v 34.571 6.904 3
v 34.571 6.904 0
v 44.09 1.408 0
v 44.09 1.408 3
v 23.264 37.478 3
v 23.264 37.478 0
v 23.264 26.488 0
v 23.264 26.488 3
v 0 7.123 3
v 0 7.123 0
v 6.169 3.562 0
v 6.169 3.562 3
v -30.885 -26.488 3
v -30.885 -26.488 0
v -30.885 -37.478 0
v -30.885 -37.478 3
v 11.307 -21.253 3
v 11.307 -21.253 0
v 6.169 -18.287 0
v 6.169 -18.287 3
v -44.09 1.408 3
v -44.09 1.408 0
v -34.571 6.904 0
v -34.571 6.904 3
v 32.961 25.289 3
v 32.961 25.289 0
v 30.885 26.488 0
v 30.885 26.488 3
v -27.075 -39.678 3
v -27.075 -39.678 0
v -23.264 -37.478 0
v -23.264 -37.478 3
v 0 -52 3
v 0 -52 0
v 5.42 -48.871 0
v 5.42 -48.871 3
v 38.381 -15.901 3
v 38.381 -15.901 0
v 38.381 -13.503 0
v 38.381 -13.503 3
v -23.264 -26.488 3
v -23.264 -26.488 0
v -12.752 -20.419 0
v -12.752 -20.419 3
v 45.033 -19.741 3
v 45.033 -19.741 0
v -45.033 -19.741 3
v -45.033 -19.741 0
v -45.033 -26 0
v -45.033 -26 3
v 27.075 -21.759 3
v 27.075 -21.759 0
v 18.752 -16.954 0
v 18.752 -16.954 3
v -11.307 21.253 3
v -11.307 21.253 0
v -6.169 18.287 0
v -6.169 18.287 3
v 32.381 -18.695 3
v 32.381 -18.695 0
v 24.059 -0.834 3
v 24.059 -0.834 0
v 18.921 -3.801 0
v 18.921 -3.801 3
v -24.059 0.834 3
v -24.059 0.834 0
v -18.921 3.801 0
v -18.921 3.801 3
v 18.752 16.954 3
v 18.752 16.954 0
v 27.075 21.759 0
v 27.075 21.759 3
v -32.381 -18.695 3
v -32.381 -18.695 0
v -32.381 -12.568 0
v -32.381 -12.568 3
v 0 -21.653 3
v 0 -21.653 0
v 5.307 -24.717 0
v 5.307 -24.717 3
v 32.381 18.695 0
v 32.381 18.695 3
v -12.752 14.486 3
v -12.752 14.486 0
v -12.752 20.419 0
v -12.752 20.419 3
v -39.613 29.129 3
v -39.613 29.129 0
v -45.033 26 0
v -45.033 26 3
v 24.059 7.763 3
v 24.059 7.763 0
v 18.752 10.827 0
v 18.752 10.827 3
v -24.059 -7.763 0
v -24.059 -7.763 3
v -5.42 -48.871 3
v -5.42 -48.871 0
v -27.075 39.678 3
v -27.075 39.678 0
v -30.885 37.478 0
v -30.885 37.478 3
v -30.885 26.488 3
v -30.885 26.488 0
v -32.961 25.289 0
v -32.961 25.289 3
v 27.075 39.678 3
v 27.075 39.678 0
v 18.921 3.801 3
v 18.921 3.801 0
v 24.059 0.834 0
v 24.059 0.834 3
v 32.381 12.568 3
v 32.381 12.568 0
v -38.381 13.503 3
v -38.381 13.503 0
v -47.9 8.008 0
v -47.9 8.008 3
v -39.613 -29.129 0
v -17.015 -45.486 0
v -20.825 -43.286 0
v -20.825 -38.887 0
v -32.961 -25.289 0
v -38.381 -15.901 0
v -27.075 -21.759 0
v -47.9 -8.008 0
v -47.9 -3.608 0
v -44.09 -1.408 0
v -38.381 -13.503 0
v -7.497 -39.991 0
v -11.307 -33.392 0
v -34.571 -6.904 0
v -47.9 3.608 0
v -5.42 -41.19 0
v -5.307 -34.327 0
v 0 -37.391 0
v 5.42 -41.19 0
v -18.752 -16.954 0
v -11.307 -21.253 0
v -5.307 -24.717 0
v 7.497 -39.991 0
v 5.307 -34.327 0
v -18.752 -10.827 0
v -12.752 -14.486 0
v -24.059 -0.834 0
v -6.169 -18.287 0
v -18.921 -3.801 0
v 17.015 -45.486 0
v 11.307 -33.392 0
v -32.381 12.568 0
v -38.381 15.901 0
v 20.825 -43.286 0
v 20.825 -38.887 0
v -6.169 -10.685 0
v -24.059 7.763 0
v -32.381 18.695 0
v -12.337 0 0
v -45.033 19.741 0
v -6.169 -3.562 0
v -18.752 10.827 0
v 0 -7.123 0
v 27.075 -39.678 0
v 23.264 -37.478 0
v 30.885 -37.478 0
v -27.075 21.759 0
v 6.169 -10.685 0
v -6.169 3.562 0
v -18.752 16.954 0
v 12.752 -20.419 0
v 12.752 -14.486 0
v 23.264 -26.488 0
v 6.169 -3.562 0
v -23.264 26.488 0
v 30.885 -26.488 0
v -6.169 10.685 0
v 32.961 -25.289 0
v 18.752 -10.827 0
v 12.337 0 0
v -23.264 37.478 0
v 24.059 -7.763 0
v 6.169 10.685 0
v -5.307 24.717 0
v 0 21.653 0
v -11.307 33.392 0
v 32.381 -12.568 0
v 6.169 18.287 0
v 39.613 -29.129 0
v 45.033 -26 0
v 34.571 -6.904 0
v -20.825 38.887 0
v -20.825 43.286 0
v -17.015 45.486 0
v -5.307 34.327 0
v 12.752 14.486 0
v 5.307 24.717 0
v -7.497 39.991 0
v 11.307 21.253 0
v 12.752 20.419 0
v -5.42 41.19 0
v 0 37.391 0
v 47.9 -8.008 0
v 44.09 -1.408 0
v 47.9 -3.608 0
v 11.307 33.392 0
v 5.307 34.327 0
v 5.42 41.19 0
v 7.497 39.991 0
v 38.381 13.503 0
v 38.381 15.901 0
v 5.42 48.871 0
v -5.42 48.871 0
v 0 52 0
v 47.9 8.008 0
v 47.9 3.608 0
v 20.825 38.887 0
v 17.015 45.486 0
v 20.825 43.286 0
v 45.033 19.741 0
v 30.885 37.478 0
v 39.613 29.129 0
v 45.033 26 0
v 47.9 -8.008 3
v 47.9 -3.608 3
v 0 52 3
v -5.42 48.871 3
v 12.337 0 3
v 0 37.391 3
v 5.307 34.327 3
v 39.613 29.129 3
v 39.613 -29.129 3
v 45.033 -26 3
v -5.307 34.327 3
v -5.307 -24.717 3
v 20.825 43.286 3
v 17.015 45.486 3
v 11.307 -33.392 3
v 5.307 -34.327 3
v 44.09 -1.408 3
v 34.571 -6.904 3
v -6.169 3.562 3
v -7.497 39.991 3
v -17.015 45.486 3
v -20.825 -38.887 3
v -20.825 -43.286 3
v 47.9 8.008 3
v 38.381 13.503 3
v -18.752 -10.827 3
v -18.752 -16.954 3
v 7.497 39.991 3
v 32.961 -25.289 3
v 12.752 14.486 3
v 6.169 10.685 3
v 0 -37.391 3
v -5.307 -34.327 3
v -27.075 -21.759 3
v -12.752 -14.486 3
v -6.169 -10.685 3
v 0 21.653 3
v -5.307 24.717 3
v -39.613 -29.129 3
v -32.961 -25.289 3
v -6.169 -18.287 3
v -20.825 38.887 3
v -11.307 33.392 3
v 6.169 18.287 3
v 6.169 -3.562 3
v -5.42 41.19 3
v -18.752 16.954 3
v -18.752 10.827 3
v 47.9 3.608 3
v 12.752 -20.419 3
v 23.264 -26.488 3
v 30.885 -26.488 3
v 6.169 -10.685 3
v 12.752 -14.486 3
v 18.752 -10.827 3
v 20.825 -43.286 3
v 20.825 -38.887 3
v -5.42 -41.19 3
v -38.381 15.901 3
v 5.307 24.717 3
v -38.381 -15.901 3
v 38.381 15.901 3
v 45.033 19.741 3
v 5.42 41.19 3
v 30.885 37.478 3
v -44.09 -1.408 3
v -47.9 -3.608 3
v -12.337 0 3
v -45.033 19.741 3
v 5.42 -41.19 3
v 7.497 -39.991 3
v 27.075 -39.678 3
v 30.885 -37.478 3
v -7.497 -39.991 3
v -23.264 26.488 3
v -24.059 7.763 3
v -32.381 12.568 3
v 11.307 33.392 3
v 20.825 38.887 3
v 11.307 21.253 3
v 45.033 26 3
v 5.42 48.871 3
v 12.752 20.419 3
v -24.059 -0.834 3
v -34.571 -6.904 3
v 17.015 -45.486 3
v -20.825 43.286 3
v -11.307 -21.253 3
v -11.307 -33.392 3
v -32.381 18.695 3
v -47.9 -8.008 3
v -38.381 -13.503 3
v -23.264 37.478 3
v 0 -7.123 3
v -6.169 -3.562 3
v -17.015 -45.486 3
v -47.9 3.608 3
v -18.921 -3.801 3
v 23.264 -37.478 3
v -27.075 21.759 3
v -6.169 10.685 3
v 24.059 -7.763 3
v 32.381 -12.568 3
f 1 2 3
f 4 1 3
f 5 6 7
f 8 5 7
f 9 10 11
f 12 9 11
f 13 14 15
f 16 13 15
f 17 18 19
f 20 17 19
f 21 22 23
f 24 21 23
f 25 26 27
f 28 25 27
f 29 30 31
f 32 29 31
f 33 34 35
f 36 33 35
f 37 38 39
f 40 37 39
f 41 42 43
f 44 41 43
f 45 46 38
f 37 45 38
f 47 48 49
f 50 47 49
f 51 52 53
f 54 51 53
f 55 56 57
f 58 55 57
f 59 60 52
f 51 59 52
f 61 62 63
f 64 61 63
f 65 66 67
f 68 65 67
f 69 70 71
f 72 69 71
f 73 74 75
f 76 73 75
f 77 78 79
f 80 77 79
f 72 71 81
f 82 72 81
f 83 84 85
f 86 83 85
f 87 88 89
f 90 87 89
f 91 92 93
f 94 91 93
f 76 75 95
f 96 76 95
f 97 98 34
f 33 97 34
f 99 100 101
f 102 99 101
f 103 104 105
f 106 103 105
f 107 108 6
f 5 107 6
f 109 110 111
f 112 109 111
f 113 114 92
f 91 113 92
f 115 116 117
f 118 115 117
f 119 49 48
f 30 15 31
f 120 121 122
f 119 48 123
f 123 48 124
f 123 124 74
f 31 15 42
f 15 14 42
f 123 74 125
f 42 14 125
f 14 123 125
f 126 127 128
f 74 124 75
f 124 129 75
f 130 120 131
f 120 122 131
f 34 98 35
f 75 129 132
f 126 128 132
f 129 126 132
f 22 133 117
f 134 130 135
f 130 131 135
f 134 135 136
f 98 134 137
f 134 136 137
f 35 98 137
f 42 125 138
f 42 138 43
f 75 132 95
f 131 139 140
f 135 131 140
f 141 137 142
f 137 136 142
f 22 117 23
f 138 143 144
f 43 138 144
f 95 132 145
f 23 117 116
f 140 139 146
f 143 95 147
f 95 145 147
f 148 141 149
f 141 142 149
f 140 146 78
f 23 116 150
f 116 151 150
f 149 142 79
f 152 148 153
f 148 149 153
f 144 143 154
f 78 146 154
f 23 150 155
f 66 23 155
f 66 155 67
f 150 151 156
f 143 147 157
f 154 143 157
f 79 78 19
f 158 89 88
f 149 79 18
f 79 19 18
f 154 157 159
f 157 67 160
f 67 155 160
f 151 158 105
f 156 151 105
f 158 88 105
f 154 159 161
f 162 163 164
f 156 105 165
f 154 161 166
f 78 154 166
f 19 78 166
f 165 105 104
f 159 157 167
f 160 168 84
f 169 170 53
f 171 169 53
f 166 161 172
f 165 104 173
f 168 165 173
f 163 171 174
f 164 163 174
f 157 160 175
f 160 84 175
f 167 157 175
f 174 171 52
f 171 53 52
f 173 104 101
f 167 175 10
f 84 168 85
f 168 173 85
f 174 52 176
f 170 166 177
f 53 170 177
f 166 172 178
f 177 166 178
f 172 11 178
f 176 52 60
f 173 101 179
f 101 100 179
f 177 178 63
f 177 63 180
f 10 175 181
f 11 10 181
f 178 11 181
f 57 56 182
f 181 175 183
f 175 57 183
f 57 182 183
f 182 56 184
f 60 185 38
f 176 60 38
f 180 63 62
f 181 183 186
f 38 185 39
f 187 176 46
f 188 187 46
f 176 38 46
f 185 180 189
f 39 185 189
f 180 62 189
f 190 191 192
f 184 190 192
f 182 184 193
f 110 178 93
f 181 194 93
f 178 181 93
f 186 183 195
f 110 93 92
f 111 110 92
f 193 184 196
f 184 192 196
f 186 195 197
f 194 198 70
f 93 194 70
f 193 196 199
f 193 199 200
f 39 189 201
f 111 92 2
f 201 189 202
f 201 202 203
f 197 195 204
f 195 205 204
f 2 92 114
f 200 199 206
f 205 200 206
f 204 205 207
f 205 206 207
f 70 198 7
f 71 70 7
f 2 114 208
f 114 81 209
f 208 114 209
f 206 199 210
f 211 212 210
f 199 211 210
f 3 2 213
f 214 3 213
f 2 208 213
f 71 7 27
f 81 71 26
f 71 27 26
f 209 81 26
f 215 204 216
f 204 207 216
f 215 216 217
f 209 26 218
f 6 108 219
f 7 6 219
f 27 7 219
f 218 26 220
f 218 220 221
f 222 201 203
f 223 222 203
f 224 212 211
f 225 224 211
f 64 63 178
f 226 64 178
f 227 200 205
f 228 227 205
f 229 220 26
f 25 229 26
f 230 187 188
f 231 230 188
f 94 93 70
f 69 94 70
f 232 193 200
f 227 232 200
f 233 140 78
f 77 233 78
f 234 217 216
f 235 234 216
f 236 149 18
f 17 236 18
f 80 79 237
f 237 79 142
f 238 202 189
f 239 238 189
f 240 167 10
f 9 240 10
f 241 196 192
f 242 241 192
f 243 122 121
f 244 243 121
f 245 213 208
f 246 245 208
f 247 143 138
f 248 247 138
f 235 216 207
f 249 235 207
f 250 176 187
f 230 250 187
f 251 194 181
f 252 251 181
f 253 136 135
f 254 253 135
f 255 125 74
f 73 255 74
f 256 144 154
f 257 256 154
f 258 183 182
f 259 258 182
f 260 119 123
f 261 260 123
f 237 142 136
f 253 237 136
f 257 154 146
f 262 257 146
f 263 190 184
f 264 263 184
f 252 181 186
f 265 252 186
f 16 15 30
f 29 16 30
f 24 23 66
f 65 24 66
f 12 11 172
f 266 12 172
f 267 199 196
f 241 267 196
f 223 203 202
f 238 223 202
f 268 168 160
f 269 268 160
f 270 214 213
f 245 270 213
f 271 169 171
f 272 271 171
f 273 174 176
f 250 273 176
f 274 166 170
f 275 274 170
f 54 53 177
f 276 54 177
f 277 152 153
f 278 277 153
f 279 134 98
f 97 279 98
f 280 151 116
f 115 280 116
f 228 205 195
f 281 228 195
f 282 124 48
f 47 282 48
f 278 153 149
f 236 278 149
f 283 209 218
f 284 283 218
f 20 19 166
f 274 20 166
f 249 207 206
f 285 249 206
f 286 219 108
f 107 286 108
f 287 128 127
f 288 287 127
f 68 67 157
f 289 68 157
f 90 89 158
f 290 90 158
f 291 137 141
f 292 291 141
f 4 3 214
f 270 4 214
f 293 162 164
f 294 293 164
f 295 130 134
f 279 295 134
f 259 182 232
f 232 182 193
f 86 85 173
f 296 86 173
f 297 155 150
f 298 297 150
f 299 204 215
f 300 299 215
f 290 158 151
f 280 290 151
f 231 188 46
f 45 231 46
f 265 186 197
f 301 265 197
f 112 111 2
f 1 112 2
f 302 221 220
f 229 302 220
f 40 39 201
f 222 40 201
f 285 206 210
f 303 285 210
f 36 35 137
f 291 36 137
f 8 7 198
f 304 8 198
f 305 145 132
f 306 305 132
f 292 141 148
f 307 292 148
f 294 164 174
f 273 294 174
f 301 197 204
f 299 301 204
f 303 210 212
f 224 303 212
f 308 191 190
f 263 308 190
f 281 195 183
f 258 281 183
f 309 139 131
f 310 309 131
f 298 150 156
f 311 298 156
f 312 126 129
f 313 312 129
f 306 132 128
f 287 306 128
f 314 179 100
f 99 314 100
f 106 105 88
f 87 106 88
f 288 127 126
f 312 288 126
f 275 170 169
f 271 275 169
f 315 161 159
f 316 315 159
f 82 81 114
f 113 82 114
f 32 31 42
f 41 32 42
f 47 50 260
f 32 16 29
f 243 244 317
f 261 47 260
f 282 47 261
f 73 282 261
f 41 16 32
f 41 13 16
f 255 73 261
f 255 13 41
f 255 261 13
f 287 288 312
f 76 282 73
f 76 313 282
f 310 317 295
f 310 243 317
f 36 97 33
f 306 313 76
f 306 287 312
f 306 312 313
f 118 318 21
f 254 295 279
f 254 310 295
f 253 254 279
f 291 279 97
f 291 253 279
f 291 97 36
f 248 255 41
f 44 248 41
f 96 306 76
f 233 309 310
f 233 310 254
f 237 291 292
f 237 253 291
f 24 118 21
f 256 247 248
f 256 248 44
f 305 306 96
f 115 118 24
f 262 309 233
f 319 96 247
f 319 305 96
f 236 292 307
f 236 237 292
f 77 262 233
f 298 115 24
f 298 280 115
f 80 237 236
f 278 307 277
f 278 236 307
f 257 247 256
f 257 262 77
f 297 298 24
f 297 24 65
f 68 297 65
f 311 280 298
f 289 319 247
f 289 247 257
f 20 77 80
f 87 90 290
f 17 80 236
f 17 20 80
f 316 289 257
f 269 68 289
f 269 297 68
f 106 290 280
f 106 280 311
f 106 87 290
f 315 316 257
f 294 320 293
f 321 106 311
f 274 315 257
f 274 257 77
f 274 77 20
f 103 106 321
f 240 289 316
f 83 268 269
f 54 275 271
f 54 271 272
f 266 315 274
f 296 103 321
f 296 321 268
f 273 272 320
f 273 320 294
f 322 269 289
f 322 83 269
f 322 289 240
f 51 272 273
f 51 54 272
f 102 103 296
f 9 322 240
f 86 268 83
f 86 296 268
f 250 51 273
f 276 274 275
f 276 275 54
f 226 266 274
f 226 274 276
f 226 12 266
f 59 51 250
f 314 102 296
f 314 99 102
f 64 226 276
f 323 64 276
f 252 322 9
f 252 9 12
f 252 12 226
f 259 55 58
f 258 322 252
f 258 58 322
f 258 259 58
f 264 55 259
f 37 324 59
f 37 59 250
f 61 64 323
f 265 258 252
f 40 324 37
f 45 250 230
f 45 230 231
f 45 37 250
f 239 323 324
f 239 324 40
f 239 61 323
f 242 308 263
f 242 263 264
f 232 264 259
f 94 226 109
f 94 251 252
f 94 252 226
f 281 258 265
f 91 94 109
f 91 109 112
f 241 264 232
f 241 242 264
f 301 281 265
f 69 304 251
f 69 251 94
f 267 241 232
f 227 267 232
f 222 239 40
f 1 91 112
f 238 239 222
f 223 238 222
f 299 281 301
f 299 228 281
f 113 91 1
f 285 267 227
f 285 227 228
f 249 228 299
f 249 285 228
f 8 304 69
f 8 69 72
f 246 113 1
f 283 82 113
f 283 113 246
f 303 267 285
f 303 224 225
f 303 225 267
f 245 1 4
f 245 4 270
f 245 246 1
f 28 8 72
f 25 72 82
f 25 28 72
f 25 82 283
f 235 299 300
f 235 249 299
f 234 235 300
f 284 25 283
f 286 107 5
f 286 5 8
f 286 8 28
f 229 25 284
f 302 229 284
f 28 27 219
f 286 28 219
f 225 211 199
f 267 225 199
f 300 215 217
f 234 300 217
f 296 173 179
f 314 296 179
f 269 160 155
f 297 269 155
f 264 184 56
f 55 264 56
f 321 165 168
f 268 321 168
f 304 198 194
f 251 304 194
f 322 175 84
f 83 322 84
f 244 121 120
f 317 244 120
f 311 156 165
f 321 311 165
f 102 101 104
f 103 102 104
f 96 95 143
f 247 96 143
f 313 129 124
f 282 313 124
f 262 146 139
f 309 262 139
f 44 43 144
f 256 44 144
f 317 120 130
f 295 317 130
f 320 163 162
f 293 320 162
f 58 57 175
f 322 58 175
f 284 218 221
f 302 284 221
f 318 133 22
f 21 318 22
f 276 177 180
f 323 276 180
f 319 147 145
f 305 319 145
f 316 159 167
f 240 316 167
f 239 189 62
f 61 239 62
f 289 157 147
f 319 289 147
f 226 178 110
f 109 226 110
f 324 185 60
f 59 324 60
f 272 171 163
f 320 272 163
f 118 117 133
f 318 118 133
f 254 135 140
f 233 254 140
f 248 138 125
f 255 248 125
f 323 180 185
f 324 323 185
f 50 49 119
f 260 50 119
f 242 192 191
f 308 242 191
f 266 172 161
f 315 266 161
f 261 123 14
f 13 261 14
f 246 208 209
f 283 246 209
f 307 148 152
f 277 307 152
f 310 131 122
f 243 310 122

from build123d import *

# Parameters (mm, degrees)
F1_DEPTH = 1.5
F2_SCALE = 2


with BuildPart() as f1:
    # F0 (on Top) → F1 (new body)
    with BuildSketch(Plane.XY):
        Polygon((-6.1687498137, 0), (-3.0843749069, 1.7807646828), (-3.0843749069, 5.3422940483), (-6.3761018887, 7.2427735073), (-6.3761018887, 10.2092925487), (-11.6322247993, 13.243916526), (-13.537250454, 14.3437836005), (-15.4422761086, 13.243916526), (-16.480613925, 12.6444319082), (-19.1907062114, 11.0797593971), (-19.1907062114, 7.9504143749), (-19.1907062114, 6.7514451393), (-19.1907062114, 4.5517109903), (-17.2856805568, 3.4518439158), (-12.0295576462, 0.4172199384), (-9.4604767956, 1.9004794591), align=None)
        Polygon((-16.1907062114, 6.2837617978), (-16.1907062114, 9.3477085895), (-13.537250454, 10.8796819854), (-9.3761018887, 8.4772417411), (-9.3761018887, 5.4132949494), (-12.0295576462, 3.8813215535), align=None, mode=Mode.SUBTRACT)
        Polygon((-3.0843749069, -1.7807646828), (-3.0843749069, 1.7807646828), (-6.1687498137, 0), align=None)
        Polygon((-3.0843749069, 5.3422940483), (-3.0843749069, 1.7807646828), (0, 3.5615293655), align=None)
        Polygon((-3.0843749069, 9.1432529664), (-3.0843749069, 5.3422940483), (0, 3.5615293655), (3.0843749069, 5.3422940483), (3.0843749069, 9.1432529664), (5.6534557575, 10.6265124871), (5.6534557575, 16.6957604418), (5.6534557575, 18.8954945908), (3.7484301028, 19.9953616653), (2.7100922865, 20.5948462831), (0, 22.1595187942), (-2.7100922865, 20.5948462831), (-3.7484301028, 19.9953616653), (-5.6534557575, 18.8954945908), (-5.6534557575, 16.6957604418), (-5.6534557575, 10.6265124871), align=None)
        Polygon((-2.6534557575, 17.1634437832), (0, 18.6954171791), (2.6534557575, 17.1634437832), (2.6534557575, 12.3585632946), (0, 10.8265898988), (-2.6534557575, 12.3585632946), align=None, mode=Mode.SUBTRACT)
        Polygon((-3.0843749069, -1.7807646828), (-6.1687498137, 0), (-9.4604767956, -1.9004794591), (-12.0295576462, -0.4172199384), (-17.2856805568, -3.4518439158), (-19.1907062114, -4.5517109903), (-19.1907062114, -6.7514451393), (-19.1907062114, -7.9504143749), (-19.1907062114, -11.0797593971), (-16.480613925, -12.6444319082), (-15.4422761086, -13.243916526), (-13.537250454, -14.3437836005), (-11.6322247993, -13.243916526), (-6.3761018887, -10.2092925487), (-6.3761018887, -7.2427735073), (-3.0843749069, -5.3422940483), align=None)
        Polygon((-13.537250454, -10.8796819854), (-16.1907062114, -9.3477085895), (-16.1907062114, -6.2837617978), (-12.0295576462, -3.8813215535), (-9.3761018887, -5.4132949494), (-9.3761018887, -8.4772417411), align=None, mode=Mode.SUBTRACT)
        Polygon((3.0843749069, 5.3422940483), (0, 3.5615293655), (3.0843749069, 1.7807646828), align=None)
        Polygon((0, -3.5615293655), (-3.0843749069, -1.7807646828), (-3.0843749069, -5.3422940483), align=None)
        Polygon((6.3761018887, 7.2427735073), (3.0843749069, 5.3422940483), (3.0843749069, 1.7807646828), (6.1687498137, 0), (9.4604767956, 1.9004794591), (12.0295576462, 0.4172199384), (17.2856805568, 3.4518439158), (19.1907062114, 4.5517109903), (19.1907062114, 6.7514451393), (19.1907062114, 7.9504143749), (19.1907062114, 11.0797593971), (16.480613925, 12.6444319082), (15.4422761086, 13.243916526), (13.537250454, 14.3437836005), (11.6322247993, 13.243916526), (6.3761018887, 10.2092925487), align=None)
        Polygon((13.537250454, 10.8796819854), (16.1907062114, 9.3477085895), (16.1907062114, 6.2837617978), (12.0295576462, 3.8813215535), (9.3761018887, 5.4132949494), (9.3761018887, 8.4772417411), align=None, mode=Mode.SUBTRACT)
        Polygon((6.1687498137, 0), (3.0843749069, 1.7807646828), (3.0843749069, -1.7807646828), align=None)
        Polygon((0, -3.5615293655), (-3.0843749069, -5.3422940483), (-3.0843749069, -9.1432529664), (-5.6534557575, -10.6265124871), (-5.6534557575, -16.6957604418), (-5.6534557575, -18.8954945908), (-3.7484301028, -19.9953616653), (-2.7100922865, -20.5948462831), (0, -22.1595187942), (2.7100922865, -20.5948462831), (3.7484301028, -19.9953616653), (5.6534557575, -18.8954945908), (5.6534557575, -16.6957604418), (5.6534557575, -10.6265124871), (3.0843749069, -9.1432529664), (3.0843749069, -5.3422940483), align=None)
        Polygon((2.6534557575, -17.1634437832), (0, -18.6954171791), (-2.6534557575, -17.1634437832), (-2.6534557575, -12.3585632946), (0, -10.8265898988), (2.6534557575, -12.3585632946), align=None, mode=Mode.SUBTRACT)
        Polygon((3.0843749069, -1.7807646828), (0, -3.5615293655), (3.0843749069, -5.3422940483), align=None)
        Polygon((9.4604767956, -1.9004794591), (6.1687498137, 0), (3.0843749069, -1.7807646828), (3.0843749069, -5.3422940483), (6.3761018887, -7.2427735073), (6.3761018887, -10.2092925487), (11.6322247993, -13.243916526), (13.537250454, -14.3437836005), (15.4422761086, -13.243916526), (16.480613925, -12.6444319082), (19.1907062114, -11.0797593971), (19.1907062114, -7.9504143749), (19.1907062114, -6.7514451393), (19.1907062114, -4.5517109903), (17.2856805568, -3.4518439158), (12.0295576462, -0.4172199384), align=None)
        Polygon((16.1907062114, -6.2837617978), (16.1907062114, -9.3477085895), (13.537250454, -10.8796819854), (9.3761018887, -8.4772417411), (9.3761018887, -5.4132949494), (12.0295576462, -3.8813215535), align=None, mode=Mode.SUBTRACT)
        Polygon((-10.4125291109, 19.4434127235), (-5.6534557575, 16.6957604418), (-5.6534557575, 18.8954945908), (-3.7484301028, 19.9953616653), (-8.5075034563, 22.743013947), (-10.4125291109, 21.6431468725), align=None)
        Polygon((-13.537250454, 14.3437836005), (-11.6322247993, 13.243916526), (-11.6322247993, 18.7392210894), (-13.537250454, 19.839088164), (-15.4422761086, 18.7392210894), (-15.4422761086, 13.243916526), align=None)
        Polygon((-22.0447539102, 0.704191634), (-17.2856805568, 3.4518439158), (-19.1907062114, 4.5517109903), (-19.1907062114, 6.7514451393), (-23.9497795649, 4.0037928576), (-23.9497795649, 1.8040587086), align=None)
        Polygon((-19.1907062114, -4.5517109903), (-17.2856805568, -3.4518439158), (-22.0447539102, -0.704191634), (-23.9497795649, -1.8040587086), (-23.9497795649, -4.0037928576), (-19.1907062114, -6.7514451393), align=None)
        Polygon((5.6534557575, 18.8954945908), (5.6534557575, 16.6957604418), (10.4125291109, 19.4434127235), (10.4125291109, 21.6431468725), (8.5075034563, 22.743013947), (3.7484301028, 19.9953616653), align=None)
        Polygon((11.6322247993, 18.7392210894), (11.6322247993, 13.243916526), (13.537250454, 14.3437836005), (15.4422761086, 13.243916526), (15.4422761086, 18.7392210894), (13.537250454, 19.839088164), align=None)
        Polygon((-11.6322247993, -18.7392210894), (-11.6322247993, -13.243916526), (-13.537250454, -14.3437836005), (-15.4422761086, -13.243916526), (-15.4422761086, -18.7392210894), (-13.537250454, -19.839088164), align=None)
        Polygon((-5.6534557575, -18.8954945908), (-5.6534557575, -16.6957604418), (-10.4125291109, -19.4434127235), (-10.4125291109, -21.6431468725), (-8.5075034563, -22.743013947), (-3.7484301028, -19.9953616653), align=None)
        Polygon((22.0447539102, -0.704191634), (17.2856805568, -3.4518439158), (19.1907062114, -4.5517109903), (19.1907062114, -6.7514451393), (23.9497795649, -4.0037928576), (23.9497795649, -1.8040587086), align=None)
        Polygon((19.1907062114, 4.5517109903), (17.2856805568, 3.4518439158), (22.0447539102, 0.704191634), (23.9497795649, 1.8040587086), (23.9497795649, 4.0037928576), (19.1907062114, 6.7514451393), align=None)
        Polygon((10.4125291109, -19.4434127235), (5.6534557575, -16.6957604418), (5.6534557575, -18.8954945908), (3.7484301028, -19.9953616653), (8.5075034563, -22.743013947), (10.4125291109, -21.6431468725), align=None)
        Polygon((13.537250454, -14.3437836005), (11.6322247993, -13.243916526), (11.6322247993, -18.7392210894), (13.537250454, -19.839088164), (15.4422761086, -18.7392210894), (15.4422761086, -13.243916526), align=None)
        Polygon((-2.7100922865, 24.4353274889), (-2.7100922865, 20.5948462831), (0, 22.1595187942), (2.7100922865, 20.5948462831), (2.7100922865, 24.4353274889), (0, 26), align=None)
        Polygon((-19.1907062114, 11.0797593971), (-16.480613925, 12.6444319082), (-19.8065682119, 14.5646725111), (-22.5166604984, 13), (-22.5166604984, 9.8706549778), (-19.1907062114, 7.9504143749), align=None)
        Polygon((-19.1907062114, -11.0797593971), (-19.1907062114, -7.9504143749), (-22.5166604984, -9.8706549778), (-22.5166604984, -13), (-19.8065682119, -14.5646725111), (-16.480613925, -12.6444319082), align=None)
        Polygon((19.8065682119, 14.5646725111), (16.480613925, 12.6444319082), (19.1907062114, 11.0797593971), (19.1907062114, 7.9504143749), (22.5166604984, 9.8706549778), (22.5166604984, 13), align=None)
        Polygon((0, -22.1595187942), (-2.7100922865, -20.5948462831), (-2.7100922865, -24.4353274889), (0, -26), (2.7100922865, -24.4353274889), (2.7100922865, -20.5948462831), align=None)
        Polygon((22.5166604984, -9.8706549778), (19.1907062114, -7.9504143749), (19.1907062114, -11.0797593971), (16.480613925, -12.6444319082), (19.8065682119, -14.5646725111), (22.5166604984, -13), align=None)
    extrude(amount=F1_DEPTH)


with BuildPart() as f1_1:
    # F2: moved
    add(f1.part.scale(F2_SCALE))


solid = f1_1.part
